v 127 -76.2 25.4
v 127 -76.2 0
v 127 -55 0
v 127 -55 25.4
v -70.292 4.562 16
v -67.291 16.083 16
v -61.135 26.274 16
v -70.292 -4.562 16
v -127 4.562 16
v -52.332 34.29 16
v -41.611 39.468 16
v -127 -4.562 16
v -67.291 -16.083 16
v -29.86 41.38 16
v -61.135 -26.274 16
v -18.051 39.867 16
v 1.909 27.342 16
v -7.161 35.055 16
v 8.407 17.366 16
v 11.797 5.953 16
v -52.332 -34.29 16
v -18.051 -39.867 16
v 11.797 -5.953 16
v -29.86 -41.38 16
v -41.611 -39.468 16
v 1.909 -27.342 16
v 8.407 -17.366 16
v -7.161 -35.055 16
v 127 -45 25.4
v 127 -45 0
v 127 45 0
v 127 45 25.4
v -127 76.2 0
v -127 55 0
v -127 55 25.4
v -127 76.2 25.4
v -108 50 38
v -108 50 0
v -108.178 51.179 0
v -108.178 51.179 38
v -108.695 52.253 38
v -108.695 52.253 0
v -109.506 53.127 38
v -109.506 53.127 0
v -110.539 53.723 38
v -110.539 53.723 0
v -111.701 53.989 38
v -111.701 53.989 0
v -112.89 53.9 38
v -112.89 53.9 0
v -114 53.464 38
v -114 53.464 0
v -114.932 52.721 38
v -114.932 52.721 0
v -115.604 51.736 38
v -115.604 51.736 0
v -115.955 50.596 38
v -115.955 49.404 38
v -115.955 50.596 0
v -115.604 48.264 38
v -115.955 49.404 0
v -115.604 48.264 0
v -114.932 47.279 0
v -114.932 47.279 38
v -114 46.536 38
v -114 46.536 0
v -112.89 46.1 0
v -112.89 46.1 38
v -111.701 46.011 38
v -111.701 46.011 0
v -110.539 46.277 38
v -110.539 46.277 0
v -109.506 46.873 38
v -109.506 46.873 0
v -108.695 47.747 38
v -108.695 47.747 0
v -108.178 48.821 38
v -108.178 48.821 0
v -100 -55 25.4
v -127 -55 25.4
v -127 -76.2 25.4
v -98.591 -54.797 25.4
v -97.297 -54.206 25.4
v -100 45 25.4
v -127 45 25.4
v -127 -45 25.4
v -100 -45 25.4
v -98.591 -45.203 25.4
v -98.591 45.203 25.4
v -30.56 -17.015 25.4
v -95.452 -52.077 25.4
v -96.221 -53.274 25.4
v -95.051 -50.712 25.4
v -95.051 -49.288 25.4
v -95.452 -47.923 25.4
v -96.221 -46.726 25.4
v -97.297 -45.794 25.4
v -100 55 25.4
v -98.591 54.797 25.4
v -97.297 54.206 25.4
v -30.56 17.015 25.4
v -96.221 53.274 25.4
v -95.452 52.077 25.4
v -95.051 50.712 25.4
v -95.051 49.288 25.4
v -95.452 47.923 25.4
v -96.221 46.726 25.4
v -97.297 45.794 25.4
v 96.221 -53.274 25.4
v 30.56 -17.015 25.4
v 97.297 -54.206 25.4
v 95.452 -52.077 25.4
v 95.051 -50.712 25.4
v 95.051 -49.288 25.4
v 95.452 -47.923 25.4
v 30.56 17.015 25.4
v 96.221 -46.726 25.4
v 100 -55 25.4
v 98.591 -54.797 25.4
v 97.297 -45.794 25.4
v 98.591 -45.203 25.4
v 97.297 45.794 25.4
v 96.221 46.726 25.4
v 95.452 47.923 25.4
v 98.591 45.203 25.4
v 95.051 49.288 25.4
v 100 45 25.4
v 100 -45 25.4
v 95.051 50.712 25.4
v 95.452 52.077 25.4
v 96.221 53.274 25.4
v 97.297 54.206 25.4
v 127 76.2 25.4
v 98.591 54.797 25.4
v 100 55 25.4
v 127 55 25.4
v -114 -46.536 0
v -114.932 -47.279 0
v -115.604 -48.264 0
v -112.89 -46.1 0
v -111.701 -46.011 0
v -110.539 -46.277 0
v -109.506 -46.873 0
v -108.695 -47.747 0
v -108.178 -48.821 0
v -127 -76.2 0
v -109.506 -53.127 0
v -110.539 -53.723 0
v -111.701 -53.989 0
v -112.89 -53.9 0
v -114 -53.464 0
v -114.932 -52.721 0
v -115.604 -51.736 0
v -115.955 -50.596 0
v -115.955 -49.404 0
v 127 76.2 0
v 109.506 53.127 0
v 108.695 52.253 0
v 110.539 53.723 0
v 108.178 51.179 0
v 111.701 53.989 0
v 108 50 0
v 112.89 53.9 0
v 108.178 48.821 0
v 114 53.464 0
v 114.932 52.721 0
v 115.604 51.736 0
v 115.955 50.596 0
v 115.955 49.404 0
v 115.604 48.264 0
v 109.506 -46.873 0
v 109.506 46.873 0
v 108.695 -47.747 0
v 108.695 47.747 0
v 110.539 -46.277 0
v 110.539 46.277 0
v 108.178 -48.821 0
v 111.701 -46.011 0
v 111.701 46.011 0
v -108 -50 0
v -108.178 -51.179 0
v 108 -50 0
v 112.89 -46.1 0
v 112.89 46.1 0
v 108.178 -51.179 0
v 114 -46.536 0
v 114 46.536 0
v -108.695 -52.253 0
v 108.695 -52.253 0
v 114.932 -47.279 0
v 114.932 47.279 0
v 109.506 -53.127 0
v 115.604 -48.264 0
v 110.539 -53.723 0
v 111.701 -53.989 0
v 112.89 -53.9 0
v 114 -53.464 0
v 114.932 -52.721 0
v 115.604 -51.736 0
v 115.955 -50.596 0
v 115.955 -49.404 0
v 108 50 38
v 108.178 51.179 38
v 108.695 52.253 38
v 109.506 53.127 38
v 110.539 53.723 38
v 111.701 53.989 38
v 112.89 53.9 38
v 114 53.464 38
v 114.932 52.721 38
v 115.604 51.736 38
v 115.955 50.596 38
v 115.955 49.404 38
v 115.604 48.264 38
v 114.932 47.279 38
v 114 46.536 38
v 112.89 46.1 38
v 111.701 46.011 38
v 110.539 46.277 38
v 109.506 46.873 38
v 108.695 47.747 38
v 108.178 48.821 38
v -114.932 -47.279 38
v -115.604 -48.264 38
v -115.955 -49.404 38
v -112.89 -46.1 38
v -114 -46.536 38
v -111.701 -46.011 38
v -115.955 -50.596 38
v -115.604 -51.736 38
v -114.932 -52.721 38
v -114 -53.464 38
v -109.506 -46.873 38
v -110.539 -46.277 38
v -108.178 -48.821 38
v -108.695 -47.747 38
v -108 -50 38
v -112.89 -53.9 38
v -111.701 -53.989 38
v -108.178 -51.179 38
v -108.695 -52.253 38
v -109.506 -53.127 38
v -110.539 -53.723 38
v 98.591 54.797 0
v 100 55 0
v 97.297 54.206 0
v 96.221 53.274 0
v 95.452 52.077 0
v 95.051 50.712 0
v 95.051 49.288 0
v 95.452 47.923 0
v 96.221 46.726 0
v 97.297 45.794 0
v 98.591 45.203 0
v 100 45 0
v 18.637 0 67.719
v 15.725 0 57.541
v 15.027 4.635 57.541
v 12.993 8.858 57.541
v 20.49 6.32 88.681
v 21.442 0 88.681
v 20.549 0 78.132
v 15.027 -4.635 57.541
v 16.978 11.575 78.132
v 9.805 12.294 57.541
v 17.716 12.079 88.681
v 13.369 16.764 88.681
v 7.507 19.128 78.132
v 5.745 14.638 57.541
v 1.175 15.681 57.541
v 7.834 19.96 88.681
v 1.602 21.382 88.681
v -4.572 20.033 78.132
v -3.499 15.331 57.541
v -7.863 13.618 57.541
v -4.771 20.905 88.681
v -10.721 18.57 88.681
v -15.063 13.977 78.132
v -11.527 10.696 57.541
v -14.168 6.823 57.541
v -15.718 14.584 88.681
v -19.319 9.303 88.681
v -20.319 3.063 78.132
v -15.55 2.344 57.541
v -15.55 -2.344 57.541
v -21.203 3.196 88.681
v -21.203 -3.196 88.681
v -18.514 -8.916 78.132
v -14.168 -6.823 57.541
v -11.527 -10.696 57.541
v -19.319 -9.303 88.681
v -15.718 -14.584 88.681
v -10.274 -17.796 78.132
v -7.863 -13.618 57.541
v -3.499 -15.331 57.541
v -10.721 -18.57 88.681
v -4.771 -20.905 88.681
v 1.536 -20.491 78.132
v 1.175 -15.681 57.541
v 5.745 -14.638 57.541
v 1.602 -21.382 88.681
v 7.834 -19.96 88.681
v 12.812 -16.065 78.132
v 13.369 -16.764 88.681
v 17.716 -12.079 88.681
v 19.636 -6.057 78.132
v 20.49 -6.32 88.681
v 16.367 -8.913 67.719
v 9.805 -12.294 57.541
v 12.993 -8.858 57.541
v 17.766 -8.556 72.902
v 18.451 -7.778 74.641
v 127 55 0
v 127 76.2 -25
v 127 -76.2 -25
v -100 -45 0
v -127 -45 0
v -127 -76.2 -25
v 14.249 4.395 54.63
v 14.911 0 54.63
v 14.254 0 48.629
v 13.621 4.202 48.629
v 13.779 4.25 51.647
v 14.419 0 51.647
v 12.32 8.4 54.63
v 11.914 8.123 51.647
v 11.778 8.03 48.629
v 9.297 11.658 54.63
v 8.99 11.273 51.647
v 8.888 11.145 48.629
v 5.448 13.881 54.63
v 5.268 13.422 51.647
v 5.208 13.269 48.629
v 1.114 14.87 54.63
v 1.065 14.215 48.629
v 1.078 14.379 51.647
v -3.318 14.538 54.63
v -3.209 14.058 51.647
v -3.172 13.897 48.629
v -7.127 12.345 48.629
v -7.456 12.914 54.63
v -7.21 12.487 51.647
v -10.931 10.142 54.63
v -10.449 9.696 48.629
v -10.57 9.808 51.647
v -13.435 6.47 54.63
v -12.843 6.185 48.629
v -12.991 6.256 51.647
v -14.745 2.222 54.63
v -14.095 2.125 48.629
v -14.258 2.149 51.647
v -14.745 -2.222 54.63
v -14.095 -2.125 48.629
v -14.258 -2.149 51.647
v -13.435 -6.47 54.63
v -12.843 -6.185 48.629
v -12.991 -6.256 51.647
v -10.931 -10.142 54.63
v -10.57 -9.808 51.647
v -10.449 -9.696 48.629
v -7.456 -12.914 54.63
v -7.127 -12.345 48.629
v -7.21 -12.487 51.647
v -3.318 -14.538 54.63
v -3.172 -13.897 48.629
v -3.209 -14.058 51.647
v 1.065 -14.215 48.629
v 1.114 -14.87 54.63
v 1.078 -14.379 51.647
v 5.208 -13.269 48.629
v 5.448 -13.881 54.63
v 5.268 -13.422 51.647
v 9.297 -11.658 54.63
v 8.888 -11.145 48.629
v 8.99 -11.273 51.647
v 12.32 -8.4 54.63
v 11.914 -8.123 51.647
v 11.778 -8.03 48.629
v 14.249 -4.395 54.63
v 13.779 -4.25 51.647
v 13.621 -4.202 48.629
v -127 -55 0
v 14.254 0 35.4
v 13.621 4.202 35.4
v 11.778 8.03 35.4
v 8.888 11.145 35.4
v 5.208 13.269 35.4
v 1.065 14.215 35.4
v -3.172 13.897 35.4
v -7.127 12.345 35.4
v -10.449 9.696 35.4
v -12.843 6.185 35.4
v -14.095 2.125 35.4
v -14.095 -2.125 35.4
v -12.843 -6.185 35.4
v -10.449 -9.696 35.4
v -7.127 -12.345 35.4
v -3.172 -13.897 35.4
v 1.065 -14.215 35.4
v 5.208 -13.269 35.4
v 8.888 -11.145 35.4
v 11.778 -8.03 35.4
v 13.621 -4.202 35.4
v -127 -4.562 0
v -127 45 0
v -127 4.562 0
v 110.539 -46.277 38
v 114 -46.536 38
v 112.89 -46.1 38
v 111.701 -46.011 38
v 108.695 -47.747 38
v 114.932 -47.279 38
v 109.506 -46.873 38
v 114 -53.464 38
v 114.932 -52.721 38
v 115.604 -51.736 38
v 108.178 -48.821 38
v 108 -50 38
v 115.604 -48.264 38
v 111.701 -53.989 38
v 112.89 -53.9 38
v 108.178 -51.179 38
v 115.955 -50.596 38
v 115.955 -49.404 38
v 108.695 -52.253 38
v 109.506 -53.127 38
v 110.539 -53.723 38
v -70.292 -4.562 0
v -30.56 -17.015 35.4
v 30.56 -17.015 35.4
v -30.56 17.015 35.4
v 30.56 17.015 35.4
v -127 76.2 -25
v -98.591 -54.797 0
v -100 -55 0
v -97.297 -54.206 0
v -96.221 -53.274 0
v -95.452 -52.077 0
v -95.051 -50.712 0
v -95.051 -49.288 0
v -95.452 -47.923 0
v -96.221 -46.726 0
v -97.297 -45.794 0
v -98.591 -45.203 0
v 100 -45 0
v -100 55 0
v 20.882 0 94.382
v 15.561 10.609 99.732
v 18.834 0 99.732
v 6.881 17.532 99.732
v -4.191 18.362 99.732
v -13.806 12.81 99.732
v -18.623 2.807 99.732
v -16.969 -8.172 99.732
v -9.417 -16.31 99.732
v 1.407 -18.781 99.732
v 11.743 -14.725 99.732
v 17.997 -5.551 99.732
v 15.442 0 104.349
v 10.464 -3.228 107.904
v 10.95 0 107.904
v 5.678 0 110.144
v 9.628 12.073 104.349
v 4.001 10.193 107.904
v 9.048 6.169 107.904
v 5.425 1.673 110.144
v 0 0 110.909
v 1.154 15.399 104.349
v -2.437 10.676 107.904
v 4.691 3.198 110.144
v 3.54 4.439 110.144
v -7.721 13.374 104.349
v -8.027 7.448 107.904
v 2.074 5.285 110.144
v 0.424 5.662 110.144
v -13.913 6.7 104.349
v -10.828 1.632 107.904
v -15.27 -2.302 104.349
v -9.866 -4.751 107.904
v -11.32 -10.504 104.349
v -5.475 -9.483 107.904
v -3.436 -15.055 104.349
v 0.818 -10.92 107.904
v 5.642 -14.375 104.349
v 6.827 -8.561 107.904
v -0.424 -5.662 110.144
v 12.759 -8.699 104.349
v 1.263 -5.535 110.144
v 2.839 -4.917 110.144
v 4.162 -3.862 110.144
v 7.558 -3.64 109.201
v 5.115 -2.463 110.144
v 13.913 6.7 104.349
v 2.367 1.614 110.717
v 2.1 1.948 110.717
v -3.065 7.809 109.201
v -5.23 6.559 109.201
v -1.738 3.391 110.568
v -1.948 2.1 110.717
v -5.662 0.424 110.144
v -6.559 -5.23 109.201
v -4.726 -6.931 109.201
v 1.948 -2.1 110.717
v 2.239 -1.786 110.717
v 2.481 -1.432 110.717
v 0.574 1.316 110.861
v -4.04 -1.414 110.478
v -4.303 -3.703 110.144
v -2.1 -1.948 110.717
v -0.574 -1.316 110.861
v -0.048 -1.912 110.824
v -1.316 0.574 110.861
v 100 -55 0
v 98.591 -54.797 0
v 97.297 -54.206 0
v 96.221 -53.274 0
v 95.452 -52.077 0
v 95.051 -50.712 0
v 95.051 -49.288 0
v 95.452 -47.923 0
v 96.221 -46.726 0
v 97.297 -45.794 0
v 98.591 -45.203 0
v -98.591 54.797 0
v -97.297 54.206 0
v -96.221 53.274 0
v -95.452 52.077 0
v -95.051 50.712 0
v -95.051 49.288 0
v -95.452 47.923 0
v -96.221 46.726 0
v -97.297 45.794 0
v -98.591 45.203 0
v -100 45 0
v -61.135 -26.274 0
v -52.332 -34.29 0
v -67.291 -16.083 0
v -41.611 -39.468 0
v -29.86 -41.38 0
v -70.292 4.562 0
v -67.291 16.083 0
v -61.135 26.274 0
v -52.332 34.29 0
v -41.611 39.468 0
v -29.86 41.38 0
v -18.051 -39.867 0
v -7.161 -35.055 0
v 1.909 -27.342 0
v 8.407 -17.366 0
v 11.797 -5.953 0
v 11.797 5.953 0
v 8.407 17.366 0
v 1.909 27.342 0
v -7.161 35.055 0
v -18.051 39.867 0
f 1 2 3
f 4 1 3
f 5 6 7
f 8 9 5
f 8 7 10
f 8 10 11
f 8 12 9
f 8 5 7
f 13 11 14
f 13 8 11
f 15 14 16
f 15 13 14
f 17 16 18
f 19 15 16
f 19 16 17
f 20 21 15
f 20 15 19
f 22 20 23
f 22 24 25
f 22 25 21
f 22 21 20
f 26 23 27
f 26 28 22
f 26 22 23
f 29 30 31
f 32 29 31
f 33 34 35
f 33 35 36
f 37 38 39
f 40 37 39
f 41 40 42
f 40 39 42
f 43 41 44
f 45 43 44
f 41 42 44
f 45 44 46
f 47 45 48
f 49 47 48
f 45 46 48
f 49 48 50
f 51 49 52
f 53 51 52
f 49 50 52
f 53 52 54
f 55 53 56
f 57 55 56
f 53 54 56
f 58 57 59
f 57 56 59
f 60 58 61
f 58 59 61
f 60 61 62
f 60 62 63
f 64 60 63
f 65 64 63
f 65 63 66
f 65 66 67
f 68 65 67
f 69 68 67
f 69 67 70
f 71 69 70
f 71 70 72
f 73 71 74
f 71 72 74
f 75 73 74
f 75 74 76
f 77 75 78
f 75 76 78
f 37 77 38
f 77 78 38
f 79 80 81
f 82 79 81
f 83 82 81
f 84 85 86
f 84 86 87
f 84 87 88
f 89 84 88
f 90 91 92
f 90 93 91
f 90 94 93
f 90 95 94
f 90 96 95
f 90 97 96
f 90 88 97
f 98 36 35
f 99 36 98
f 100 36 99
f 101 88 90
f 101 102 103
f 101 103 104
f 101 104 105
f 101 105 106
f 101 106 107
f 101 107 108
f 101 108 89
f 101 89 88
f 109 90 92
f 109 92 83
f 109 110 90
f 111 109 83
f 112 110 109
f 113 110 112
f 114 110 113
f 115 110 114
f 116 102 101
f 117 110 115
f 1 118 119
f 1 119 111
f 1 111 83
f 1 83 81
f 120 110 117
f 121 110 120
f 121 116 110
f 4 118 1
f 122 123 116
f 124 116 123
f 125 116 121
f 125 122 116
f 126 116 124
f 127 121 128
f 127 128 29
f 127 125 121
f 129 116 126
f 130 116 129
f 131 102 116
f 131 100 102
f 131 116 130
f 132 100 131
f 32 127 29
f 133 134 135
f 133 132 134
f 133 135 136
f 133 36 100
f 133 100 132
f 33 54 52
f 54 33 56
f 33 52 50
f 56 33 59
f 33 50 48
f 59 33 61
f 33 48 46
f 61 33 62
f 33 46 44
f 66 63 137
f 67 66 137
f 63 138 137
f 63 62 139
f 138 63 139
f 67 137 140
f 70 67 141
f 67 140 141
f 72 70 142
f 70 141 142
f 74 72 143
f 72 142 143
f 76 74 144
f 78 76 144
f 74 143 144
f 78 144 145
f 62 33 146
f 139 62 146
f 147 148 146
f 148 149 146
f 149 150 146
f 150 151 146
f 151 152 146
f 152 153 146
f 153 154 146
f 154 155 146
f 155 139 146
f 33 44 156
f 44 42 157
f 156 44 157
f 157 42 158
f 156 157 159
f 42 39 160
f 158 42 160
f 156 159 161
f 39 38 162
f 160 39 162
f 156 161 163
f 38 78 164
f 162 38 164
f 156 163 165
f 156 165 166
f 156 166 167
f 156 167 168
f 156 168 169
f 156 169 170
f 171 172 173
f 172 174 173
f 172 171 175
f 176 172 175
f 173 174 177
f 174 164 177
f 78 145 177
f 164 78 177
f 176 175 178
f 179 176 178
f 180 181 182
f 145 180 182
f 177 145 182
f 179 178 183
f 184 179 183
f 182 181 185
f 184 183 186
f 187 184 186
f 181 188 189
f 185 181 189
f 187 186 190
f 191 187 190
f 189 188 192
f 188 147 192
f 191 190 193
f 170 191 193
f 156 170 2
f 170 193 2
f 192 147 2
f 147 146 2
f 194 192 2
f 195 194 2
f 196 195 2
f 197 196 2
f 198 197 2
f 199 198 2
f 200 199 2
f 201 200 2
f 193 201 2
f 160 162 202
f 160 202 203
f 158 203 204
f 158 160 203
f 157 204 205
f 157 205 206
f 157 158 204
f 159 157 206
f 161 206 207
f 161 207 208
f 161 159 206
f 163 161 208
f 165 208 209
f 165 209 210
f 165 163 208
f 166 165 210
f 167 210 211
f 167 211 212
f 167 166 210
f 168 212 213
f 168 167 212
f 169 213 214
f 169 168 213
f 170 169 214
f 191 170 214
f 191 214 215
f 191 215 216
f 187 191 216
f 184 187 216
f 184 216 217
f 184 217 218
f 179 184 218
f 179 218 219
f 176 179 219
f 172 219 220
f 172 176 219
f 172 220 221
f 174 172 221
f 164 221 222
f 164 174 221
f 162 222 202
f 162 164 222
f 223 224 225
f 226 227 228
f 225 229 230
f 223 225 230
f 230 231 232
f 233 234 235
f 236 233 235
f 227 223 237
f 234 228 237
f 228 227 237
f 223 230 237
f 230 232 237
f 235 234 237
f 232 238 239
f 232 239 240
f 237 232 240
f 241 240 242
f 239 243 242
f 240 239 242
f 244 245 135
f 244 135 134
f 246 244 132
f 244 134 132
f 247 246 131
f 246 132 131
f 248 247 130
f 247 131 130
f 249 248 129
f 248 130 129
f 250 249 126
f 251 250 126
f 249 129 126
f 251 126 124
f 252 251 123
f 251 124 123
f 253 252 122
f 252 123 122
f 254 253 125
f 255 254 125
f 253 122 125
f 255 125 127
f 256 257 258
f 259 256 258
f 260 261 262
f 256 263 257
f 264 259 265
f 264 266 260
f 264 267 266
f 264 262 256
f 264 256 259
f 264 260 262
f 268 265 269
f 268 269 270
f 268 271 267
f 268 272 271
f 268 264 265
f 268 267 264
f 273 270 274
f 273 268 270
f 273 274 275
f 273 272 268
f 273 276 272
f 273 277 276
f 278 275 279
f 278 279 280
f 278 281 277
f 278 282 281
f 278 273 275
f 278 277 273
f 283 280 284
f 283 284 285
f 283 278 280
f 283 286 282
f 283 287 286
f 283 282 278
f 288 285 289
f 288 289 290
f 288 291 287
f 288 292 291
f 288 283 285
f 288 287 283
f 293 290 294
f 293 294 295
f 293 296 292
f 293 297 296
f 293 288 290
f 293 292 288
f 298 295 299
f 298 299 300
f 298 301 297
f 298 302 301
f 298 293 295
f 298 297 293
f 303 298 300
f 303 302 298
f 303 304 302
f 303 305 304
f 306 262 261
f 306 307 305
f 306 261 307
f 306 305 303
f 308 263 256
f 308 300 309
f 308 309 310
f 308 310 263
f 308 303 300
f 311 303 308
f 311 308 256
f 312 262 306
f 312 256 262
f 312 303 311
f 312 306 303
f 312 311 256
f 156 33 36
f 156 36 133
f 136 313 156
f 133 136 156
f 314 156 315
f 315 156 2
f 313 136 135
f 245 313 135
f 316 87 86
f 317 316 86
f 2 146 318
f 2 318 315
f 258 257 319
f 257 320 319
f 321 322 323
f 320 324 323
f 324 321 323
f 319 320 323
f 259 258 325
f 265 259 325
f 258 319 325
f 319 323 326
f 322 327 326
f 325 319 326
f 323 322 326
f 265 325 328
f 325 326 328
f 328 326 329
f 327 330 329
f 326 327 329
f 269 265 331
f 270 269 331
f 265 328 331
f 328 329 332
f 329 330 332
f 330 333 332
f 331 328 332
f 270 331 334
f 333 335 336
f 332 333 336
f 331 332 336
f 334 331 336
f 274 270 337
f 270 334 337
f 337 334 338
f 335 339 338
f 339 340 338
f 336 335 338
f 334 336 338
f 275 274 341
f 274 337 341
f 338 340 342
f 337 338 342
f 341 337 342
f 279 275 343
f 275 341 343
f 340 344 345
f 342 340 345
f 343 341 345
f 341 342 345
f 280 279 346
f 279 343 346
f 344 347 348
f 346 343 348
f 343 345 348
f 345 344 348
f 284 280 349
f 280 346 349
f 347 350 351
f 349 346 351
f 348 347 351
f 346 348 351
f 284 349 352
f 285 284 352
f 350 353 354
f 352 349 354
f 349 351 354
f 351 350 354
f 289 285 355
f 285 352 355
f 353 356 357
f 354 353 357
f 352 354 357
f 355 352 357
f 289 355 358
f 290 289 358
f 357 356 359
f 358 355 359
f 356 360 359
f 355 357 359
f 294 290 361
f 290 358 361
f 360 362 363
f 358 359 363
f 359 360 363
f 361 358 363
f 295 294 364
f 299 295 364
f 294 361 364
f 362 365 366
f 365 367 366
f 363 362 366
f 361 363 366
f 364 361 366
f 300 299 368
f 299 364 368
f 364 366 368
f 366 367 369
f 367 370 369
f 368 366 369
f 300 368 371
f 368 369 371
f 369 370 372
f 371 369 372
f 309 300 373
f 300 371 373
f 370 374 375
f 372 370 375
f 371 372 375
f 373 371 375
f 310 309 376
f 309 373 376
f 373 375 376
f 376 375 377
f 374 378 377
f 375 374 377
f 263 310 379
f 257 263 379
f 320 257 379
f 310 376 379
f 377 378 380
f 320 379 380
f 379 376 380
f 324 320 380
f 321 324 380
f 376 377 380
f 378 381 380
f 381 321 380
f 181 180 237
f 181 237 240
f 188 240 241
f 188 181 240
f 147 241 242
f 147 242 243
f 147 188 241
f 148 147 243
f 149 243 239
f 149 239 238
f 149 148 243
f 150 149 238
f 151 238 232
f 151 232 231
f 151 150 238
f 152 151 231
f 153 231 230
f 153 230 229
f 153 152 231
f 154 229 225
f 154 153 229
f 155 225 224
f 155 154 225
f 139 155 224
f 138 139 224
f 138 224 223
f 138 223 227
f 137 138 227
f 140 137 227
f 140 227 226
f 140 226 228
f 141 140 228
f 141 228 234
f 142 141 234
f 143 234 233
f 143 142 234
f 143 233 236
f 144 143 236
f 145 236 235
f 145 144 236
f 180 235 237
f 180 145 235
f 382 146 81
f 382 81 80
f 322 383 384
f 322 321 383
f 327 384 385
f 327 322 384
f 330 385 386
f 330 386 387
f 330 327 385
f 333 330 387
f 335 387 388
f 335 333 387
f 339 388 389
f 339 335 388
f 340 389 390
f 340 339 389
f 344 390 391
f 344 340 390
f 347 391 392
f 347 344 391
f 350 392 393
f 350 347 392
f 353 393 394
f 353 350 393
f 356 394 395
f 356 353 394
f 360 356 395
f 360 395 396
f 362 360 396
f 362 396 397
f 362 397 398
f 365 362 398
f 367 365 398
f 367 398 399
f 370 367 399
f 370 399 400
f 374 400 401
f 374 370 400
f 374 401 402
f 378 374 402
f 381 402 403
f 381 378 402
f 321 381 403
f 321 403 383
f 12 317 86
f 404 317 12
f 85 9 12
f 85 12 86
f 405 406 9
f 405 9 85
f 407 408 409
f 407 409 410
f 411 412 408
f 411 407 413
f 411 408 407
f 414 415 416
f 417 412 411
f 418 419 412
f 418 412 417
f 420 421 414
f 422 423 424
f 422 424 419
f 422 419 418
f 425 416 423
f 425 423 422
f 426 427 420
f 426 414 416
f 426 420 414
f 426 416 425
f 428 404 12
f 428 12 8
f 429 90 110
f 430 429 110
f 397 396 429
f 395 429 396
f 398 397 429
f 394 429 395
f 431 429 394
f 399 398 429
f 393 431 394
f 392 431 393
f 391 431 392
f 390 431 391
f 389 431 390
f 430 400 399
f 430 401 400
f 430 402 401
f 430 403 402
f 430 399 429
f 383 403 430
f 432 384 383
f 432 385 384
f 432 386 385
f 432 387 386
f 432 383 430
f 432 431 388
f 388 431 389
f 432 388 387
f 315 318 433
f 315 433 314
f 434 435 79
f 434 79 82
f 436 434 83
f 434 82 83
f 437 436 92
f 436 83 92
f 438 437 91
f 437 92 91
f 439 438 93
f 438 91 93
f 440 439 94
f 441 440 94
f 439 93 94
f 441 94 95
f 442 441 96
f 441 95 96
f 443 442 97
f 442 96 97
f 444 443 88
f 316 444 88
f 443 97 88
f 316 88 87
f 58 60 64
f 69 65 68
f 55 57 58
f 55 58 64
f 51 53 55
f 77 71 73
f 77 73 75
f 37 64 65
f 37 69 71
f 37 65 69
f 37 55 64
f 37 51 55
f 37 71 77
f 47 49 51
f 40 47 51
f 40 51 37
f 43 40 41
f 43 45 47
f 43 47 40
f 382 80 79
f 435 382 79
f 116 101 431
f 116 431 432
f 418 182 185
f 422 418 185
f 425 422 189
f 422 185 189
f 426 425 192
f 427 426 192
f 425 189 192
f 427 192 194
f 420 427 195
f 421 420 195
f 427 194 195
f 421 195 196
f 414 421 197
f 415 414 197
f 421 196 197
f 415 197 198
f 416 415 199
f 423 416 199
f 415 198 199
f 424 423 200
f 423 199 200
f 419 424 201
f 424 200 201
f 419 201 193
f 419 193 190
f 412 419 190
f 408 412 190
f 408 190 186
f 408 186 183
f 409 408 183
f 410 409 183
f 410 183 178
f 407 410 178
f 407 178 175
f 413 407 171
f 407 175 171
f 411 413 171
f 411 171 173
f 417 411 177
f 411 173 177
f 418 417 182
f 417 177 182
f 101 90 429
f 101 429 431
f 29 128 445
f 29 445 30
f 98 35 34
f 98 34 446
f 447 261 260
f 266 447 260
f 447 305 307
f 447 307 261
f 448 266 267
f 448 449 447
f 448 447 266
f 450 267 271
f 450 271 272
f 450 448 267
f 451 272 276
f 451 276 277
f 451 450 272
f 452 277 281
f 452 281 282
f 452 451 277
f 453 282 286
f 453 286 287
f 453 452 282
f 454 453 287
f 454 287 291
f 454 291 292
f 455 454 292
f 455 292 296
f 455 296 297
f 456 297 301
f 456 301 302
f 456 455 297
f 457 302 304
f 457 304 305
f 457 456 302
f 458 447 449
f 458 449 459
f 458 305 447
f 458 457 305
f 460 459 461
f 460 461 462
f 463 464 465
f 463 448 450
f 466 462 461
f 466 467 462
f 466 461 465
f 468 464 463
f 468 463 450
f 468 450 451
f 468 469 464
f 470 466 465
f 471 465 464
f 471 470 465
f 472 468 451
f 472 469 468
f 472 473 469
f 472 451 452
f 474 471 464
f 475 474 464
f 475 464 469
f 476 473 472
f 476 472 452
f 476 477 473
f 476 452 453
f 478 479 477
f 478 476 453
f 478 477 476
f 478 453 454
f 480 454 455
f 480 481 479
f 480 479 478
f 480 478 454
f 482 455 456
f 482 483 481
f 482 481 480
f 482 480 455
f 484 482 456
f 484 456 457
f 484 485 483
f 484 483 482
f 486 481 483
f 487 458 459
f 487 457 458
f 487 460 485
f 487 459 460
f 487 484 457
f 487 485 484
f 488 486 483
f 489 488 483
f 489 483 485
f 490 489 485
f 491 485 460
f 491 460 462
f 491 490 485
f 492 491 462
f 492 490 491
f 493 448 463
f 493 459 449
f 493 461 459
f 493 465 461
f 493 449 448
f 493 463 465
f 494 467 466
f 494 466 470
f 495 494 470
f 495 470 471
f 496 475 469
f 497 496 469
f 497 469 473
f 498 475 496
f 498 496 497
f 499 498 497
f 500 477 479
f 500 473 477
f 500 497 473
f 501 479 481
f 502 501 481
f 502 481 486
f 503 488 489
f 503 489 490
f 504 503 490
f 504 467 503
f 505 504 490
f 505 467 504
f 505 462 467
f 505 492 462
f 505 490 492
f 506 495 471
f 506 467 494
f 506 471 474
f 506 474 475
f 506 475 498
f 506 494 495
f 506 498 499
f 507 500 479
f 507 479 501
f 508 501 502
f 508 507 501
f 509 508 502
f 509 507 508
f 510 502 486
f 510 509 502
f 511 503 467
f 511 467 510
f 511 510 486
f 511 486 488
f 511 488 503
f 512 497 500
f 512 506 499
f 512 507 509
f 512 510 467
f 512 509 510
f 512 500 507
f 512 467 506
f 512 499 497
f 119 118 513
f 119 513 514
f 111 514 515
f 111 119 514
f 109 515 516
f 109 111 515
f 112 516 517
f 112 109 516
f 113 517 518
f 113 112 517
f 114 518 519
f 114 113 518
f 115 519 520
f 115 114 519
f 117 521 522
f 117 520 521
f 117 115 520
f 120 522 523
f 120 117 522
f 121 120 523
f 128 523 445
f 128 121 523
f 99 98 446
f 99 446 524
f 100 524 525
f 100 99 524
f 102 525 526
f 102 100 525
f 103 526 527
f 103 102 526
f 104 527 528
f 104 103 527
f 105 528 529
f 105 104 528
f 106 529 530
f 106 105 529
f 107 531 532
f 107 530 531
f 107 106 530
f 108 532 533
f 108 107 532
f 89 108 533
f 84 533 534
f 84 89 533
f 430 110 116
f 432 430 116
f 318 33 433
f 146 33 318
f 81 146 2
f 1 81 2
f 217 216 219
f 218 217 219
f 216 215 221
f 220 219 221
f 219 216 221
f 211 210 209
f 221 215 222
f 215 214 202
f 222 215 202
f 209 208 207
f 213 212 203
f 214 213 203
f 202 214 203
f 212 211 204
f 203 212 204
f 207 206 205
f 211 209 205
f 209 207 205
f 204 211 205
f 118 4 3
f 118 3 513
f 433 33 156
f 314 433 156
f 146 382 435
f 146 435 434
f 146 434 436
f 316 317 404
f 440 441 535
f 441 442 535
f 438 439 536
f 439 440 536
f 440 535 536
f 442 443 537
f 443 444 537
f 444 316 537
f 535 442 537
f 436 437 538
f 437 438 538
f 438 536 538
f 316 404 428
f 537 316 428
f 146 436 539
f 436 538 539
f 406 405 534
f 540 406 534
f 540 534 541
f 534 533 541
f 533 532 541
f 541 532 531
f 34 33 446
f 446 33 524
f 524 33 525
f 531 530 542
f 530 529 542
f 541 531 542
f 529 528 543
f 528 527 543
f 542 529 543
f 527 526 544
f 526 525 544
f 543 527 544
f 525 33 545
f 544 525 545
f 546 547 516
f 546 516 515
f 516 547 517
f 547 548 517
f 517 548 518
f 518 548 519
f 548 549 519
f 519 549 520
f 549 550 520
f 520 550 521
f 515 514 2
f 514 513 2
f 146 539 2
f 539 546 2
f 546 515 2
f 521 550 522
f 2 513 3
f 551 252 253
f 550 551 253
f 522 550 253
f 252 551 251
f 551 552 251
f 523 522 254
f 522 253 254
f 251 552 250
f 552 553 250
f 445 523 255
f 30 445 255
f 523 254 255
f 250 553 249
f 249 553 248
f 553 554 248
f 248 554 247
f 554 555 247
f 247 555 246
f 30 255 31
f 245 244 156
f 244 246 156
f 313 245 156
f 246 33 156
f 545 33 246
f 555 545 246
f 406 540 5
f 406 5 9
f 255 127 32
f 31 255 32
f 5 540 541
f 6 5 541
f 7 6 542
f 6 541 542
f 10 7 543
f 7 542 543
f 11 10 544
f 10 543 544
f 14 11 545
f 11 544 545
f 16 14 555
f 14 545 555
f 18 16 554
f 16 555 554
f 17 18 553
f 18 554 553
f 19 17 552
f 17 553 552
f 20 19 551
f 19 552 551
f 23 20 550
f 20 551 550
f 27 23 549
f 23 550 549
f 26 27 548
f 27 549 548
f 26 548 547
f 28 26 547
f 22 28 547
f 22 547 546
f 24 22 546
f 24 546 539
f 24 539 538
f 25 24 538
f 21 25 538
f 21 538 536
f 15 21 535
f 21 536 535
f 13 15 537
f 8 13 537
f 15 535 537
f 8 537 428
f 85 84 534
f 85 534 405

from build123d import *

# Parameters (mm, degrees)
SKETCH_W                   = 254
SKETCH_H                   = 152.4
PAD_DEPTH                  = 25.4
POCKET_DEPTH               = 619.999755
POCKET_MIRRORED_2_DEPTH    = 619.999755
SKETCH002_W                = 61.12
SKETCH002_H                = 34.03
PAD001_DEPTH               = 10
POCKET001_DEPTH            = 16
SKETCH005_W                = 254
SKETCH005_H                = 152.4
PAD002_DEPTH               = 25
SKETCH007_R                = 4
PAD003_DEPTH               = 38
SKETCH007_MIRRORED002_2_R  = 4
PAD003_MIRRORED002_2_DEPTH = 38


with BuildPart() as body:
    # Sketch → Pad (new body)
    with BuildSketch(Plane.XY):
        Rectangle(SKETCH_W, SKETCH_H)
    extrude(amount=PAD_DEPTH)

    # Sketch001 (on Face6 of Pad) → Pocket (cut, through all)
    with BuildSketch(Plane.XY.offset(25.4)):
        with BuildLine():
            Line((133.014114, 55), (100, 55))
            ThreePointArc((100, 55), (95, 50), (100, 45))
            Line((100, 45), (133.014114, 45))
            Line((133.014114, 45), (133.014114, 55))
        make_face()
    pocket = extrude(amount=-POCKET_DEPTH, mode=Mode.SUBTRACT)

    # Sketch001 Mirrored 2 → Pocket Mirrored 2 (cut, through all)
    with BuildSketch(Plane(origin=(0, 0, 25.4), x_dir=(-1, 0, 0), z_dir=(0, 0, -1))):
        with BuildLine():
            Line((133.014114, 55), (100, 55))
            ThreePointArc((100, 55), (95, 50), (100, 45))
            Line((100, 45), (133.014114, 45))
            Line((133.014114, 45), (133.014114, 55))
        make_face()
    pocket_mirrored_2 = extrude(amount=POCKET_MIRRORED_2_DEPTH, mode=Mode.SUBTRACT)

    # Mirrored001: Pocket, Pocket Mirrored 2 across XZ
    add(pocket.mirror(Plane.XZ), mode=Mode.SUBTRACT)
    add(pocket_mirrored_2.mirror(Plane.XZ), mode=Mode.SUBTRACT)

    # Sketch002 (on Face5 of MultiTransform) → Pad001 (join)
    with BuildSketch(Plane.XY.offset(25.4)):
        Rectangle(SKETCH002_W, SKETCH002_H)
    extrude(amount=PAD001_DEPTH)

    # Sketch003 → Revolution (revolve)
    with BuildSketch(Plane.XZ):
        with BuildLine():
            Line((0, 35.4), (14.254485, 35.4))
            Line((14.254485, 35.4), (14.254485, 48.629384))
            ThreePointArc((15.725214, 57.54054), (14.624637, 53.145238), (14.254485, 48.629384))
            ThreePointArc((15.725214, 57.54054), (19.719001, 72.902145), (21.442283, 88.680597))
            ThreePointArc((21.442283, 88.680597), (15.442452, 104.349163), (0, 110.909087))
            Line((0, 110.909087), (0, 35.4))
        make_face()
    revolve(axis=Axis((0, 0, 0), (0, 0, 1)))

    # Sketch004 (on Face4 of Revolution) → Pocket001 (cut)
    with BuildSketch(Plane(origin=(0, 0, 0), x_dir=(1, 0, 0), z_dir=(0, 0, -1))):
        with BuildLine():
            ThreePointArc((-70.292156, -4.561816), (12.226985, 0), (-70.292156, 4.561816))
            Line((-139.742546, 4.561816), (-70.292156, 4.561816))
            Line((-139.742546, -4.561816), (-139.742546, 4.561816))
            Line((-70.292156, -4.561816), (-139.742546, -4.561816))
        make_face()
    extrude(amount=-POCKET001_DEPTH, mode=Mode.SUBTRACT)


with BuildPart() as body001:
    # Sketch005 (on Face1 of ShapeBinder) → Pad002 (new body)
    with BuildSketch(Plane(origin=(0, 0, 0), x_dir=(1, 0, 0), z_dir=(0, 0, -1))):
        Rectangle(SKETCH005_W, SKETCH005_H)
    extrude(amount=PAD002_DEPTH)

    # Sketch007 (on Face5 of Pad002) → Pad003 (join)
    with BuildSketch(Plane.XY):
        with Locations((-112, 50)):
            Circle(SKETCH007_R)
    pad003 = extrude(amount=PAD003_DEPTH)

    # Sketch007 Mirrored002 2 → Pad003 Mirrored002 2 (add)
    with BuildSketch(Plane(origin=(0, 0, 0), x_dir=(1, 0, 0), z_dir=(0, 0, -1))):
        with Locations((-112, 50)):
            Circle(SKETCH007_MIRRORED002_2_R)
    pad003_mirrored002_2 = extrude(amount=-PAD003_MIRRORED002_2_DEPTH)

    # Mirrored003: Pad003, Pad003 Mirrored002 2 across YZ
    add(pad003.mirror(Plane.YZ))
    add(pad003_mirrored002_2.mirror(Plane.YZ))


solid = Compound([body.part, body001.part])
